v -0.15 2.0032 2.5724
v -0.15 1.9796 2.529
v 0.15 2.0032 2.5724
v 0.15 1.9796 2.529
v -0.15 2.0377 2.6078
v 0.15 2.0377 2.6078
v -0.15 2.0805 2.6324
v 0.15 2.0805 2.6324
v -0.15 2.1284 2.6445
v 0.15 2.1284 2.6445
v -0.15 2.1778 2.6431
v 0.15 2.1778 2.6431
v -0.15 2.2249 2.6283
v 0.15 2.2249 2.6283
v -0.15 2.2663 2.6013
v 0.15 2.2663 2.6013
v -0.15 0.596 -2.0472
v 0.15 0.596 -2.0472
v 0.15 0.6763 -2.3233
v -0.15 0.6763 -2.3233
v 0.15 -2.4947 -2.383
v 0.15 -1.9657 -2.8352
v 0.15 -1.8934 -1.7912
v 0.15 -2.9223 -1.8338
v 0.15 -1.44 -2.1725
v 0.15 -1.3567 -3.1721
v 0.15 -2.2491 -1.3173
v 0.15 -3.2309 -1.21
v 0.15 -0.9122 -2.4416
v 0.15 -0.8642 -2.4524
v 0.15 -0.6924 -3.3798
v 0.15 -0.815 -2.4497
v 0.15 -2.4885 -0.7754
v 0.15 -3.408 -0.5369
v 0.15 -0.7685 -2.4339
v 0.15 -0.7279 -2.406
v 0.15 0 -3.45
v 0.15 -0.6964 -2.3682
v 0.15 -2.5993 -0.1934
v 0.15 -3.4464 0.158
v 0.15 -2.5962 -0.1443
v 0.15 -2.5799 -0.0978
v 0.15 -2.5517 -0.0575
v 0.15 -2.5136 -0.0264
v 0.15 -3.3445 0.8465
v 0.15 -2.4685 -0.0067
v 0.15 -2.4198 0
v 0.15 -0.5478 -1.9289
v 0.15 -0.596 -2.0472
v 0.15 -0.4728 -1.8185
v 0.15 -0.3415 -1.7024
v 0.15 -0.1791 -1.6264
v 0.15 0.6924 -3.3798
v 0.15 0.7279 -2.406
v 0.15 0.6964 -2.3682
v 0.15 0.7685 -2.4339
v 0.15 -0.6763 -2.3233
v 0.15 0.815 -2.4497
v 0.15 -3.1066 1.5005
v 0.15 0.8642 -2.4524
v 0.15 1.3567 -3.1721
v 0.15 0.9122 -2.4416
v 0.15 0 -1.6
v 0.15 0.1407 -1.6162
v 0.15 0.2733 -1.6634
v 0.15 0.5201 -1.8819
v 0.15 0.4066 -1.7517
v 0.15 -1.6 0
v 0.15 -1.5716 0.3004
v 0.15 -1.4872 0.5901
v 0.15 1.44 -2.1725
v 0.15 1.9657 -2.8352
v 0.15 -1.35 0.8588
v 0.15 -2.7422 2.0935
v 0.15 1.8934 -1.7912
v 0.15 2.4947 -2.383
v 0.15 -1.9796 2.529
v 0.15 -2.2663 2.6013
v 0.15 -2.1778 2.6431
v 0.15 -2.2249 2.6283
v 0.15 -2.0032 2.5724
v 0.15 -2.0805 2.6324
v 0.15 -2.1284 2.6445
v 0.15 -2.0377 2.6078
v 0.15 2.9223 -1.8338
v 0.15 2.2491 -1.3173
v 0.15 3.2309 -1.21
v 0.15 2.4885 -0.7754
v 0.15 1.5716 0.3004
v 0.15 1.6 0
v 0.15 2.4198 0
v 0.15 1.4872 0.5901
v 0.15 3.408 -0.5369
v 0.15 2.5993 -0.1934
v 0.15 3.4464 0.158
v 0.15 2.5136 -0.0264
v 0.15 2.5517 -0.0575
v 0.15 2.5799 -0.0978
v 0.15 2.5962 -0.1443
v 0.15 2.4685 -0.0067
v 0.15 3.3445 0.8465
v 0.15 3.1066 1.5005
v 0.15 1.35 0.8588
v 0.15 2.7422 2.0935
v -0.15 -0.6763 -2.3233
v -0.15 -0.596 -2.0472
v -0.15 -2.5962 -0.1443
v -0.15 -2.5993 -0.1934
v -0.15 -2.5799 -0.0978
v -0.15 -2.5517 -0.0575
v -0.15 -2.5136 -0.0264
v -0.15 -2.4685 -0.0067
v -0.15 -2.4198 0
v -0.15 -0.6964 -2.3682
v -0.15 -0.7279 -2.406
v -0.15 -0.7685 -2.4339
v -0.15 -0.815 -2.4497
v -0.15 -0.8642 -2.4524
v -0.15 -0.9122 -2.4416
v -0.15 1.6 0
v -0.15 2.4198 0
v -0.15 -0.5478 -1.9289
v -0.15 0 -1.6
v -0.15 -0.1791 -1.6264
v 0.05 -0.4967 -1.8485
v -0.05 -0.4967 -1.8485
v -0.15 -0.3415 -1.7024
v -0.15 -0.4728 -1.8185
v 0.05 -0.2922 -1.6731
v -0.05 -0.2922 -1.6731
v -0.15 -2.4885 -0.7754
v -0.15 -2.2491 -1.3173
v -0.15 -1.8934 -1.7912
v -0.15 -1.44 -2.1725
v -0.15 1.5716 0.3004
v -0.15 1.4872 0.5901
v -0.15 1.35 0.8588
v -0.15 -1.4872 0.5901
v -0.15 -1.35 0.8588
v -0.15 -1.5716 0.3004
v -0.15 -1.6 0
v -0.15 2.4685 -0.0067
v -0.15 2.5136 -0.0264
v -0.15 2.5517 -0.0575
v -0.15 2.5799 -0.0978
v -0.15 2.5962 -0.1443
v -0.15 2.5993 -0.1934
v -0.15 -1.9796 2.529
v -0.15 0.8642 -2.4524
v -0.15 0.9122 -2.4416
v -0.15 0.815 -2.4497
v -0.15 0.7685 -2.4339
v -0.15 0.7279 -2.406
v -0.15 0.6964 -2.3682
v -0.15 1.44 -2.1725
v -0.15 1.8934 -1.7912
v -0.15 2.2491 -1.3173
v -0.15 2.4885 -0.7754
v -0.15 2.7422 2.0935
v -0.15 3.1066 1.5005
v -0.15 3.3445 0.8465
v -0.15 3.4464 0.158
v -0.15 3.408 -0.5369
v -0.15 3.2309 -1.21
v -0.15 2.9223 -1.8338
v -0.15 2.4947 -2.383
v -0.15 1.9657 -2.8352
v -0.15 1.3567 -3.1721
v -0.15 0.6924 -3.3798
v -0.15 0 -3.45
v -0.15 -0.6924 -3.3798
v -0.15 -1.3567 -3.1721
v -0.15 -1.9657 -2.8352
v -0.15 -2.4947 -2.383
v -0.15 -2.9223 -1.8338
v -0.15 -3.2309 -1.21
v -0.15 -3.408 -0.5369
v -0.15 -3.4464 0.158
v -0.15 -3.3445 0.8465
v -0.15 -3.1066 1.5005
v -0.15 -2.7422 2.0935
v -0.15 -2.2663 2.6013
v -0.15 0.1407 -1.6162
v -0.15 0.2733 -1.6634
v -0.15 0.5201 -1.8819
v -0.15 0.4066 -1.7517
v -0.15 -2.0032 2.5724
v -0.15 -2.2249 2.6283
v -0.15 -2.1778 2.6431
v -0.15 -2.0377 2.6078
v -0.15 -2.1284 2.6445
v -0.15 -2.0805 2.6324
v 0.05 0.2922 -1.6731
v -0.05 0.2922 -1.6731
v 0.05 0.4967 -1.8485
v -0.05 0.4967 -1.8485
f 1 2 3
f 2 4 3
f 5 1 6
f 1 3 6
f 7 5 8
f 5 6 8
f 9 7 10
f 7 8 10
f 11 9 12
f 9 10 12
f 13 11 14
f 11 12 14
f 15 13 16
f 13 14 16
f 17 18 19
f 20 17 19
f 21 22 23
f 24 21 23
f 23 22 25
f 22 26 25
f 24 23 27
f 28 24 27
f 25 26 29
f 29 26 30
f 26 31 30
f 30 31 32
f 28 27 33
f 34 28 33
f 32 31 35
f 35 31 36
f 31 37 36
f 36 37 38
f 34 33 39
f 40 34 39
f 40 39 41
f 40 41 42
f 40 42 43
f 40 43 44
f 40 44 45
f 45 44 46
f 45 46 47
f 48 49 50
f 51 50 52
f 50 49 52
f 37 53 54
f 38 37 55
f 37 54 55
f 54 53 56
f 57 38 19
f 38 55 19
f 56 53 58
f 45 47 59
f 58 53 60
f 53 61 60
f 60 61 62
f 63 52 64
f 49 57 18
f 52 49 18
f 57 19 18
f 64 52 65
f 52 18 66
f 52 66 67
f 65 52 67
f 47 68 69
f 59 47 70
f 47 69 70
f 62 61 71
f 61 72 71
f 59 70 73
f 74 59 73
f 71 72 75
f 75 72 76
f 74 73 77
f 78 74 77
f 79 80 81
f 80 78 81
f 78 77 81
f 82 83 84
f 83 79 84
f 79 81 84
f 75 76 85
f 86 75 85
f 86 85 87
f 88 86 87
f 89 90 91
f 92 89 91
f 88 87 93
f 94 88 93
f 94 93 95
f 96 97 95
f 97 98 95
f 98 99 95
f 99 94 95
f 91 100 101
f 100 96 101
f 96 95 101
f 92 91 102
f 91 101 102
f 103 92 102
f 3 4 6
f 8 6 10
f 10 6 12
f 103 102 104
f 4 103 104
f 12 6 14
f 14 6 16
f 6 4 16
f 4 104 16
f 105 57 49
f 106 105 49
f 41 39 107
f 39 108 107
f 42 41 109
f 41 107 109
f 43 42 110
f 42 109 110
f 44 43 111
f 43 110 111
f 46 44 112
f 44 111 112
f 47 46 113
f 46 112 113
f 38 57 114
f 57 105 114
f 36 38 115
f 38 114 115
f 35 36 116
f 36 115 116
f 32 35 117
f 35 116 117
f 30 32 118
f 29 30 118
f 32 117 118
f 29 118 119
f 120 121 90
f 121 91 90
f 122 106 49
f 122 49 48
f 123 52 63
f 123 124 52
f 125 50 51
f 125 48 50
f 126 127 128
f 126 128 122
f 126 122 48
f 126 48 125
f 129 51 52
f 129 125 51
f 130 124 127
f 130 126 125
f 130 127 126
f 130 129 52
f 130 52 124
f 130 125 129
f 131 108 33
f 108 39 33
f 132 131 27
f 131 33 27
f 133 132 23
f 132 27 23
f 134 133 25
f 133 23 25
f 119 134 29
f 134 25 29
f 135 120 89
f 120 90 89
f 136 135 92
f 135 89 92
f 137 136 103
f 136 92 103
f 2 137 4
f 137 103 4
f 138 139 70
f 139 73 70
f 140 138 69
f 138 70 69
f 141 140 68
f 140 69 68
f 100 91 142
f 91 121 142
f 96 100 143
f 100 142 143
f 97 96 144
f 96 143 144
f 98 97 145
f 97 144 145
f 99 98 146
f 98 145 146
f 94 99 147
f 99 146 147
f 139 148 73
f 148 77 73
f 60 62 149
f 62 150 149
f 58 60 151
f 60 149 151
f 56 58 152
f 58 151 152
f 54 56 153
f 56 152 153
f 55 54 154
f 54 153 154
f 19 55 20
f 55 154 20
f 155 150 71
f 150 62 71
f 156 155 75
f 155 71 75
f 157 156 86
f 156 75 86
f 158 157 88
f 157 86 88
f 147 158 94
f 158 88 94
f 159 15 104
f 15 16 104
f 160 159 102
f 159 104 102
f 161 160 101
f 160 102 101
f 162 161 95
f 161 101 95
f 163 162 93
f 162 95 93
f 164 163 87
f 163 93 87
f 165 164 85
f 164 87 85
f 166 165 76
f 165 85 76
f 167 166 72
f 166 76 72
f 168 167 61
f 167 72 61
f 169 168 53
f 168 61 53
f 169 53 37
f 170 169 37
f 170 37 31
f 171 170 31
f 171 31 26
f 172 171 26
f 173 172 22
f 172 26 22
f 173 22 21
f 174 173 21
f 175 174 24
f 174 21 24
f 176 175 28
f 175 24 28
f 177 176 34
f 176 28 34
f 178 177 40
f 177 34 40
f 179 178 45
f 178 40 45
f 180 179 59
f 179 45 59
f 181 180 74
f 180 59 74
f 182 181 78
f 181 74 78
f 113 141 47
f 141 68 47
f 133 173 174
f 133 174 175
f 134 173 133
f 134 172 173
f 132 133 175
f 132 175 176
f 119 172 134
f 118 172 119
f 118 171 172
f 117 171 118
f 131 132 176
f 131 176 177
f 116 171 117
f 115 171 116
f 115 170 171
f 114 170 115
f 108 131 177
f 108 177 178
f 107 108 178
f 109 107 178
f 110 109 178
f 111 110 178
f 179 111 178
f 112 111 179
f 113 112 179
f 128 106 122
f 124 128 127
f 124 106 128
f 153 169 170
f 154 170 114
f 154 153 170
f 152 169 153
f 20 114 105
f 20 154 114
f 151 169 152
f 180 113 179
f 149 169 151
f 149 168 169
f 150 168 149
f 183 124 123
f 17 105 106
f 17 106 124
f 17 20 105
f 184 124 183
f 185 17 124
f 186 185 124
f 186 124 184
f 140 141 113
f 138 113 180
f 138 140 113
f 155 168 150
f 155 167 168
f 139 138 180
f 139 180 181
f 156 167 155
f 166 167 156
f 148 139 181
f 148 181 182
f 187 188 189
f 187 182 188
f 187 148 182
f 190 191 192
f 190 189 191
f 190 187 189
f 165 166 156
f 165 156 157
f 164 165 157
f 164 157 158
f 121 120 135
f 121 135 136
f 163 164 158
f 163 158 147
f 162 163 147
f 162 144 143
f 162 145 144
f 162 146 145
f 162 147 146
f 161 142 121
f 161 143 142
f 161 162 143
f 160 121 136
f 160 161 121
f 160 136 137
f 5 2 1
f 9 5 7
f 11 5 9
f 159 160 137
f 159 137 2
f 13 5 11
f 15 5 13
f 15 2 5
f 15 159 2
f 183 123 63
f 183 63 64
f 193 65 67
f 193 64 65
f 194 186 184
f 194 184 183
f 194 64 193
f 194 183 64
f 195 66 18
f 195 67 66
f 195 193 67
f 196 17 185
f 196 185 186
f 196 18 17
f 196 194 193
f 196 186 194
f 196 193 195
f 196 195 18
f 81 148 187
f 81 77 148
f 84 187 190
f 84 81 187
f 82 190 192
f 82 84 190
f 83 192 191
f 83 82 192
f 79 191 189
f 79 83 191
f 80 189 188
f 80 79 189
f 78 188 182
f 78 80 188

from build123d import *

# Parameters (mm, degrees)
EXTRUDE1_DEPTH = 0.15
FILLET1_R      = 0.18
FILLET2_START  = -1
FILLET2_DEPTH  = 2


with BuildPart() as part:
    # Sketch1 → Extrude1 (new, symmetric)
    with BuildSketch(Plane(origin=(0, 0, 0), x_dir=(0, 0, -1), z_dir=(1, 0, 0))):
        with BuildLine():
            Line((-2.761953542, -2.067392713), (-0.858778202, -1.35))
            ThreePointArc((-0.858778202, -1.35), (-0.447213595, -1.53622915), (0, -1.6))
            Line((0, -1.6), (0, -2.606451613))
            ThreePointArc((0, -2.606451613), (1.564404659, -2.084760915), (2.50256684, -0.728525373))
            Line((2.50256684, -0.728525373), (1.53622915, -0.447213595))
            ThreePointArc((1.53622915, -0.447213595), (1.6, 0), (1.53622915, 0.447213595))
            Line((1.53622915, 0.447213595), (2.50256684, 0.728525373))
            ThreePointArc((2.50256684, 0.728525373), (1.564404659, 2.084760915), (0, 2.606451613))
            Line((0, 2.606451613), (0, 1.6))
            ThreePointArc((0, 1.6), (-0.447213595, 1.53622915), (-0.858778202, 1.35))
            Line((-0.858778202, 1.35), (-2.761953542, 2.067392713))
            ThreePointArc((-2.761953542, 2.067392713), (3.45, 0), (-2.761953542, -2.067392713))
        make_face()
    extrude(amount=EXTRUDE1_DEPTH, both=True)

    # Fillet1
    fillet1_edges = [part.edges().sort_by_distance(p)[0] for p in [
        (0, -2.067392713, 2.761953542),
        (0, -2.606451613, 0),
        (0, -0.728525373, -2.50256684),
        (0, 0.728525373, -2.50256684),
        (0, 2.606451613, 0),
        (0, 2.067392713, 2.761953542),
    ]]
    fillet(fillet1_edges, radius=FILLET1_R)

    # Fillet2: read off the stored shape, not the designer's step
    # Fillet2 outline → Fillet2 (cut)
    with BuildSketch(Plane.YZ.offset(FILLET2_START)):
        with BuildLine():
            Line((-0.447213595, -1.53622915), (-0.595966919, -2.047213595))
            add(Edge.make_bspline(
                [(-0.595966919, -2.047213595), (-0.522890719, -1.796188606), (-0.310518672, -1.6), (0, -1.6)],
                knots=[0, 0, 0, 0, 0.5, 0.5, 0.5, 0.5], degree=3, weights=[1, 0.759836166, 0.639754249, 0.639754249]))
            ThreePointArc((0, -1.6), (-0.225868723, -1.583977058), (-0.447213595, -1.53622915))
        make_face()
        with BuildLine():
            ThreePointArc((0.447213595, -1.53622915), (0.225868723, -1.583977058), (0, -1.6))
            add(Edge.make_bspline(
                [(0, -1.6), (0.310518672, -1.6), (0.522890719, -1.796188606), (0.595966919, -2.047213595)],
                knots=[0.5, 0.5, 0.5, 0.5, 1, 1, 1, 1], degree=3, weights=[0.639754249, 0.639754249, 0.759836166, 1]))
            Line((0.595966919, -2.047213595), (0.447213595, -1.53622915))
        make_face()
    extrude(amount=FILLET2_DEPTH, mode=Mode.SUBTRACT)


solid = part.part
